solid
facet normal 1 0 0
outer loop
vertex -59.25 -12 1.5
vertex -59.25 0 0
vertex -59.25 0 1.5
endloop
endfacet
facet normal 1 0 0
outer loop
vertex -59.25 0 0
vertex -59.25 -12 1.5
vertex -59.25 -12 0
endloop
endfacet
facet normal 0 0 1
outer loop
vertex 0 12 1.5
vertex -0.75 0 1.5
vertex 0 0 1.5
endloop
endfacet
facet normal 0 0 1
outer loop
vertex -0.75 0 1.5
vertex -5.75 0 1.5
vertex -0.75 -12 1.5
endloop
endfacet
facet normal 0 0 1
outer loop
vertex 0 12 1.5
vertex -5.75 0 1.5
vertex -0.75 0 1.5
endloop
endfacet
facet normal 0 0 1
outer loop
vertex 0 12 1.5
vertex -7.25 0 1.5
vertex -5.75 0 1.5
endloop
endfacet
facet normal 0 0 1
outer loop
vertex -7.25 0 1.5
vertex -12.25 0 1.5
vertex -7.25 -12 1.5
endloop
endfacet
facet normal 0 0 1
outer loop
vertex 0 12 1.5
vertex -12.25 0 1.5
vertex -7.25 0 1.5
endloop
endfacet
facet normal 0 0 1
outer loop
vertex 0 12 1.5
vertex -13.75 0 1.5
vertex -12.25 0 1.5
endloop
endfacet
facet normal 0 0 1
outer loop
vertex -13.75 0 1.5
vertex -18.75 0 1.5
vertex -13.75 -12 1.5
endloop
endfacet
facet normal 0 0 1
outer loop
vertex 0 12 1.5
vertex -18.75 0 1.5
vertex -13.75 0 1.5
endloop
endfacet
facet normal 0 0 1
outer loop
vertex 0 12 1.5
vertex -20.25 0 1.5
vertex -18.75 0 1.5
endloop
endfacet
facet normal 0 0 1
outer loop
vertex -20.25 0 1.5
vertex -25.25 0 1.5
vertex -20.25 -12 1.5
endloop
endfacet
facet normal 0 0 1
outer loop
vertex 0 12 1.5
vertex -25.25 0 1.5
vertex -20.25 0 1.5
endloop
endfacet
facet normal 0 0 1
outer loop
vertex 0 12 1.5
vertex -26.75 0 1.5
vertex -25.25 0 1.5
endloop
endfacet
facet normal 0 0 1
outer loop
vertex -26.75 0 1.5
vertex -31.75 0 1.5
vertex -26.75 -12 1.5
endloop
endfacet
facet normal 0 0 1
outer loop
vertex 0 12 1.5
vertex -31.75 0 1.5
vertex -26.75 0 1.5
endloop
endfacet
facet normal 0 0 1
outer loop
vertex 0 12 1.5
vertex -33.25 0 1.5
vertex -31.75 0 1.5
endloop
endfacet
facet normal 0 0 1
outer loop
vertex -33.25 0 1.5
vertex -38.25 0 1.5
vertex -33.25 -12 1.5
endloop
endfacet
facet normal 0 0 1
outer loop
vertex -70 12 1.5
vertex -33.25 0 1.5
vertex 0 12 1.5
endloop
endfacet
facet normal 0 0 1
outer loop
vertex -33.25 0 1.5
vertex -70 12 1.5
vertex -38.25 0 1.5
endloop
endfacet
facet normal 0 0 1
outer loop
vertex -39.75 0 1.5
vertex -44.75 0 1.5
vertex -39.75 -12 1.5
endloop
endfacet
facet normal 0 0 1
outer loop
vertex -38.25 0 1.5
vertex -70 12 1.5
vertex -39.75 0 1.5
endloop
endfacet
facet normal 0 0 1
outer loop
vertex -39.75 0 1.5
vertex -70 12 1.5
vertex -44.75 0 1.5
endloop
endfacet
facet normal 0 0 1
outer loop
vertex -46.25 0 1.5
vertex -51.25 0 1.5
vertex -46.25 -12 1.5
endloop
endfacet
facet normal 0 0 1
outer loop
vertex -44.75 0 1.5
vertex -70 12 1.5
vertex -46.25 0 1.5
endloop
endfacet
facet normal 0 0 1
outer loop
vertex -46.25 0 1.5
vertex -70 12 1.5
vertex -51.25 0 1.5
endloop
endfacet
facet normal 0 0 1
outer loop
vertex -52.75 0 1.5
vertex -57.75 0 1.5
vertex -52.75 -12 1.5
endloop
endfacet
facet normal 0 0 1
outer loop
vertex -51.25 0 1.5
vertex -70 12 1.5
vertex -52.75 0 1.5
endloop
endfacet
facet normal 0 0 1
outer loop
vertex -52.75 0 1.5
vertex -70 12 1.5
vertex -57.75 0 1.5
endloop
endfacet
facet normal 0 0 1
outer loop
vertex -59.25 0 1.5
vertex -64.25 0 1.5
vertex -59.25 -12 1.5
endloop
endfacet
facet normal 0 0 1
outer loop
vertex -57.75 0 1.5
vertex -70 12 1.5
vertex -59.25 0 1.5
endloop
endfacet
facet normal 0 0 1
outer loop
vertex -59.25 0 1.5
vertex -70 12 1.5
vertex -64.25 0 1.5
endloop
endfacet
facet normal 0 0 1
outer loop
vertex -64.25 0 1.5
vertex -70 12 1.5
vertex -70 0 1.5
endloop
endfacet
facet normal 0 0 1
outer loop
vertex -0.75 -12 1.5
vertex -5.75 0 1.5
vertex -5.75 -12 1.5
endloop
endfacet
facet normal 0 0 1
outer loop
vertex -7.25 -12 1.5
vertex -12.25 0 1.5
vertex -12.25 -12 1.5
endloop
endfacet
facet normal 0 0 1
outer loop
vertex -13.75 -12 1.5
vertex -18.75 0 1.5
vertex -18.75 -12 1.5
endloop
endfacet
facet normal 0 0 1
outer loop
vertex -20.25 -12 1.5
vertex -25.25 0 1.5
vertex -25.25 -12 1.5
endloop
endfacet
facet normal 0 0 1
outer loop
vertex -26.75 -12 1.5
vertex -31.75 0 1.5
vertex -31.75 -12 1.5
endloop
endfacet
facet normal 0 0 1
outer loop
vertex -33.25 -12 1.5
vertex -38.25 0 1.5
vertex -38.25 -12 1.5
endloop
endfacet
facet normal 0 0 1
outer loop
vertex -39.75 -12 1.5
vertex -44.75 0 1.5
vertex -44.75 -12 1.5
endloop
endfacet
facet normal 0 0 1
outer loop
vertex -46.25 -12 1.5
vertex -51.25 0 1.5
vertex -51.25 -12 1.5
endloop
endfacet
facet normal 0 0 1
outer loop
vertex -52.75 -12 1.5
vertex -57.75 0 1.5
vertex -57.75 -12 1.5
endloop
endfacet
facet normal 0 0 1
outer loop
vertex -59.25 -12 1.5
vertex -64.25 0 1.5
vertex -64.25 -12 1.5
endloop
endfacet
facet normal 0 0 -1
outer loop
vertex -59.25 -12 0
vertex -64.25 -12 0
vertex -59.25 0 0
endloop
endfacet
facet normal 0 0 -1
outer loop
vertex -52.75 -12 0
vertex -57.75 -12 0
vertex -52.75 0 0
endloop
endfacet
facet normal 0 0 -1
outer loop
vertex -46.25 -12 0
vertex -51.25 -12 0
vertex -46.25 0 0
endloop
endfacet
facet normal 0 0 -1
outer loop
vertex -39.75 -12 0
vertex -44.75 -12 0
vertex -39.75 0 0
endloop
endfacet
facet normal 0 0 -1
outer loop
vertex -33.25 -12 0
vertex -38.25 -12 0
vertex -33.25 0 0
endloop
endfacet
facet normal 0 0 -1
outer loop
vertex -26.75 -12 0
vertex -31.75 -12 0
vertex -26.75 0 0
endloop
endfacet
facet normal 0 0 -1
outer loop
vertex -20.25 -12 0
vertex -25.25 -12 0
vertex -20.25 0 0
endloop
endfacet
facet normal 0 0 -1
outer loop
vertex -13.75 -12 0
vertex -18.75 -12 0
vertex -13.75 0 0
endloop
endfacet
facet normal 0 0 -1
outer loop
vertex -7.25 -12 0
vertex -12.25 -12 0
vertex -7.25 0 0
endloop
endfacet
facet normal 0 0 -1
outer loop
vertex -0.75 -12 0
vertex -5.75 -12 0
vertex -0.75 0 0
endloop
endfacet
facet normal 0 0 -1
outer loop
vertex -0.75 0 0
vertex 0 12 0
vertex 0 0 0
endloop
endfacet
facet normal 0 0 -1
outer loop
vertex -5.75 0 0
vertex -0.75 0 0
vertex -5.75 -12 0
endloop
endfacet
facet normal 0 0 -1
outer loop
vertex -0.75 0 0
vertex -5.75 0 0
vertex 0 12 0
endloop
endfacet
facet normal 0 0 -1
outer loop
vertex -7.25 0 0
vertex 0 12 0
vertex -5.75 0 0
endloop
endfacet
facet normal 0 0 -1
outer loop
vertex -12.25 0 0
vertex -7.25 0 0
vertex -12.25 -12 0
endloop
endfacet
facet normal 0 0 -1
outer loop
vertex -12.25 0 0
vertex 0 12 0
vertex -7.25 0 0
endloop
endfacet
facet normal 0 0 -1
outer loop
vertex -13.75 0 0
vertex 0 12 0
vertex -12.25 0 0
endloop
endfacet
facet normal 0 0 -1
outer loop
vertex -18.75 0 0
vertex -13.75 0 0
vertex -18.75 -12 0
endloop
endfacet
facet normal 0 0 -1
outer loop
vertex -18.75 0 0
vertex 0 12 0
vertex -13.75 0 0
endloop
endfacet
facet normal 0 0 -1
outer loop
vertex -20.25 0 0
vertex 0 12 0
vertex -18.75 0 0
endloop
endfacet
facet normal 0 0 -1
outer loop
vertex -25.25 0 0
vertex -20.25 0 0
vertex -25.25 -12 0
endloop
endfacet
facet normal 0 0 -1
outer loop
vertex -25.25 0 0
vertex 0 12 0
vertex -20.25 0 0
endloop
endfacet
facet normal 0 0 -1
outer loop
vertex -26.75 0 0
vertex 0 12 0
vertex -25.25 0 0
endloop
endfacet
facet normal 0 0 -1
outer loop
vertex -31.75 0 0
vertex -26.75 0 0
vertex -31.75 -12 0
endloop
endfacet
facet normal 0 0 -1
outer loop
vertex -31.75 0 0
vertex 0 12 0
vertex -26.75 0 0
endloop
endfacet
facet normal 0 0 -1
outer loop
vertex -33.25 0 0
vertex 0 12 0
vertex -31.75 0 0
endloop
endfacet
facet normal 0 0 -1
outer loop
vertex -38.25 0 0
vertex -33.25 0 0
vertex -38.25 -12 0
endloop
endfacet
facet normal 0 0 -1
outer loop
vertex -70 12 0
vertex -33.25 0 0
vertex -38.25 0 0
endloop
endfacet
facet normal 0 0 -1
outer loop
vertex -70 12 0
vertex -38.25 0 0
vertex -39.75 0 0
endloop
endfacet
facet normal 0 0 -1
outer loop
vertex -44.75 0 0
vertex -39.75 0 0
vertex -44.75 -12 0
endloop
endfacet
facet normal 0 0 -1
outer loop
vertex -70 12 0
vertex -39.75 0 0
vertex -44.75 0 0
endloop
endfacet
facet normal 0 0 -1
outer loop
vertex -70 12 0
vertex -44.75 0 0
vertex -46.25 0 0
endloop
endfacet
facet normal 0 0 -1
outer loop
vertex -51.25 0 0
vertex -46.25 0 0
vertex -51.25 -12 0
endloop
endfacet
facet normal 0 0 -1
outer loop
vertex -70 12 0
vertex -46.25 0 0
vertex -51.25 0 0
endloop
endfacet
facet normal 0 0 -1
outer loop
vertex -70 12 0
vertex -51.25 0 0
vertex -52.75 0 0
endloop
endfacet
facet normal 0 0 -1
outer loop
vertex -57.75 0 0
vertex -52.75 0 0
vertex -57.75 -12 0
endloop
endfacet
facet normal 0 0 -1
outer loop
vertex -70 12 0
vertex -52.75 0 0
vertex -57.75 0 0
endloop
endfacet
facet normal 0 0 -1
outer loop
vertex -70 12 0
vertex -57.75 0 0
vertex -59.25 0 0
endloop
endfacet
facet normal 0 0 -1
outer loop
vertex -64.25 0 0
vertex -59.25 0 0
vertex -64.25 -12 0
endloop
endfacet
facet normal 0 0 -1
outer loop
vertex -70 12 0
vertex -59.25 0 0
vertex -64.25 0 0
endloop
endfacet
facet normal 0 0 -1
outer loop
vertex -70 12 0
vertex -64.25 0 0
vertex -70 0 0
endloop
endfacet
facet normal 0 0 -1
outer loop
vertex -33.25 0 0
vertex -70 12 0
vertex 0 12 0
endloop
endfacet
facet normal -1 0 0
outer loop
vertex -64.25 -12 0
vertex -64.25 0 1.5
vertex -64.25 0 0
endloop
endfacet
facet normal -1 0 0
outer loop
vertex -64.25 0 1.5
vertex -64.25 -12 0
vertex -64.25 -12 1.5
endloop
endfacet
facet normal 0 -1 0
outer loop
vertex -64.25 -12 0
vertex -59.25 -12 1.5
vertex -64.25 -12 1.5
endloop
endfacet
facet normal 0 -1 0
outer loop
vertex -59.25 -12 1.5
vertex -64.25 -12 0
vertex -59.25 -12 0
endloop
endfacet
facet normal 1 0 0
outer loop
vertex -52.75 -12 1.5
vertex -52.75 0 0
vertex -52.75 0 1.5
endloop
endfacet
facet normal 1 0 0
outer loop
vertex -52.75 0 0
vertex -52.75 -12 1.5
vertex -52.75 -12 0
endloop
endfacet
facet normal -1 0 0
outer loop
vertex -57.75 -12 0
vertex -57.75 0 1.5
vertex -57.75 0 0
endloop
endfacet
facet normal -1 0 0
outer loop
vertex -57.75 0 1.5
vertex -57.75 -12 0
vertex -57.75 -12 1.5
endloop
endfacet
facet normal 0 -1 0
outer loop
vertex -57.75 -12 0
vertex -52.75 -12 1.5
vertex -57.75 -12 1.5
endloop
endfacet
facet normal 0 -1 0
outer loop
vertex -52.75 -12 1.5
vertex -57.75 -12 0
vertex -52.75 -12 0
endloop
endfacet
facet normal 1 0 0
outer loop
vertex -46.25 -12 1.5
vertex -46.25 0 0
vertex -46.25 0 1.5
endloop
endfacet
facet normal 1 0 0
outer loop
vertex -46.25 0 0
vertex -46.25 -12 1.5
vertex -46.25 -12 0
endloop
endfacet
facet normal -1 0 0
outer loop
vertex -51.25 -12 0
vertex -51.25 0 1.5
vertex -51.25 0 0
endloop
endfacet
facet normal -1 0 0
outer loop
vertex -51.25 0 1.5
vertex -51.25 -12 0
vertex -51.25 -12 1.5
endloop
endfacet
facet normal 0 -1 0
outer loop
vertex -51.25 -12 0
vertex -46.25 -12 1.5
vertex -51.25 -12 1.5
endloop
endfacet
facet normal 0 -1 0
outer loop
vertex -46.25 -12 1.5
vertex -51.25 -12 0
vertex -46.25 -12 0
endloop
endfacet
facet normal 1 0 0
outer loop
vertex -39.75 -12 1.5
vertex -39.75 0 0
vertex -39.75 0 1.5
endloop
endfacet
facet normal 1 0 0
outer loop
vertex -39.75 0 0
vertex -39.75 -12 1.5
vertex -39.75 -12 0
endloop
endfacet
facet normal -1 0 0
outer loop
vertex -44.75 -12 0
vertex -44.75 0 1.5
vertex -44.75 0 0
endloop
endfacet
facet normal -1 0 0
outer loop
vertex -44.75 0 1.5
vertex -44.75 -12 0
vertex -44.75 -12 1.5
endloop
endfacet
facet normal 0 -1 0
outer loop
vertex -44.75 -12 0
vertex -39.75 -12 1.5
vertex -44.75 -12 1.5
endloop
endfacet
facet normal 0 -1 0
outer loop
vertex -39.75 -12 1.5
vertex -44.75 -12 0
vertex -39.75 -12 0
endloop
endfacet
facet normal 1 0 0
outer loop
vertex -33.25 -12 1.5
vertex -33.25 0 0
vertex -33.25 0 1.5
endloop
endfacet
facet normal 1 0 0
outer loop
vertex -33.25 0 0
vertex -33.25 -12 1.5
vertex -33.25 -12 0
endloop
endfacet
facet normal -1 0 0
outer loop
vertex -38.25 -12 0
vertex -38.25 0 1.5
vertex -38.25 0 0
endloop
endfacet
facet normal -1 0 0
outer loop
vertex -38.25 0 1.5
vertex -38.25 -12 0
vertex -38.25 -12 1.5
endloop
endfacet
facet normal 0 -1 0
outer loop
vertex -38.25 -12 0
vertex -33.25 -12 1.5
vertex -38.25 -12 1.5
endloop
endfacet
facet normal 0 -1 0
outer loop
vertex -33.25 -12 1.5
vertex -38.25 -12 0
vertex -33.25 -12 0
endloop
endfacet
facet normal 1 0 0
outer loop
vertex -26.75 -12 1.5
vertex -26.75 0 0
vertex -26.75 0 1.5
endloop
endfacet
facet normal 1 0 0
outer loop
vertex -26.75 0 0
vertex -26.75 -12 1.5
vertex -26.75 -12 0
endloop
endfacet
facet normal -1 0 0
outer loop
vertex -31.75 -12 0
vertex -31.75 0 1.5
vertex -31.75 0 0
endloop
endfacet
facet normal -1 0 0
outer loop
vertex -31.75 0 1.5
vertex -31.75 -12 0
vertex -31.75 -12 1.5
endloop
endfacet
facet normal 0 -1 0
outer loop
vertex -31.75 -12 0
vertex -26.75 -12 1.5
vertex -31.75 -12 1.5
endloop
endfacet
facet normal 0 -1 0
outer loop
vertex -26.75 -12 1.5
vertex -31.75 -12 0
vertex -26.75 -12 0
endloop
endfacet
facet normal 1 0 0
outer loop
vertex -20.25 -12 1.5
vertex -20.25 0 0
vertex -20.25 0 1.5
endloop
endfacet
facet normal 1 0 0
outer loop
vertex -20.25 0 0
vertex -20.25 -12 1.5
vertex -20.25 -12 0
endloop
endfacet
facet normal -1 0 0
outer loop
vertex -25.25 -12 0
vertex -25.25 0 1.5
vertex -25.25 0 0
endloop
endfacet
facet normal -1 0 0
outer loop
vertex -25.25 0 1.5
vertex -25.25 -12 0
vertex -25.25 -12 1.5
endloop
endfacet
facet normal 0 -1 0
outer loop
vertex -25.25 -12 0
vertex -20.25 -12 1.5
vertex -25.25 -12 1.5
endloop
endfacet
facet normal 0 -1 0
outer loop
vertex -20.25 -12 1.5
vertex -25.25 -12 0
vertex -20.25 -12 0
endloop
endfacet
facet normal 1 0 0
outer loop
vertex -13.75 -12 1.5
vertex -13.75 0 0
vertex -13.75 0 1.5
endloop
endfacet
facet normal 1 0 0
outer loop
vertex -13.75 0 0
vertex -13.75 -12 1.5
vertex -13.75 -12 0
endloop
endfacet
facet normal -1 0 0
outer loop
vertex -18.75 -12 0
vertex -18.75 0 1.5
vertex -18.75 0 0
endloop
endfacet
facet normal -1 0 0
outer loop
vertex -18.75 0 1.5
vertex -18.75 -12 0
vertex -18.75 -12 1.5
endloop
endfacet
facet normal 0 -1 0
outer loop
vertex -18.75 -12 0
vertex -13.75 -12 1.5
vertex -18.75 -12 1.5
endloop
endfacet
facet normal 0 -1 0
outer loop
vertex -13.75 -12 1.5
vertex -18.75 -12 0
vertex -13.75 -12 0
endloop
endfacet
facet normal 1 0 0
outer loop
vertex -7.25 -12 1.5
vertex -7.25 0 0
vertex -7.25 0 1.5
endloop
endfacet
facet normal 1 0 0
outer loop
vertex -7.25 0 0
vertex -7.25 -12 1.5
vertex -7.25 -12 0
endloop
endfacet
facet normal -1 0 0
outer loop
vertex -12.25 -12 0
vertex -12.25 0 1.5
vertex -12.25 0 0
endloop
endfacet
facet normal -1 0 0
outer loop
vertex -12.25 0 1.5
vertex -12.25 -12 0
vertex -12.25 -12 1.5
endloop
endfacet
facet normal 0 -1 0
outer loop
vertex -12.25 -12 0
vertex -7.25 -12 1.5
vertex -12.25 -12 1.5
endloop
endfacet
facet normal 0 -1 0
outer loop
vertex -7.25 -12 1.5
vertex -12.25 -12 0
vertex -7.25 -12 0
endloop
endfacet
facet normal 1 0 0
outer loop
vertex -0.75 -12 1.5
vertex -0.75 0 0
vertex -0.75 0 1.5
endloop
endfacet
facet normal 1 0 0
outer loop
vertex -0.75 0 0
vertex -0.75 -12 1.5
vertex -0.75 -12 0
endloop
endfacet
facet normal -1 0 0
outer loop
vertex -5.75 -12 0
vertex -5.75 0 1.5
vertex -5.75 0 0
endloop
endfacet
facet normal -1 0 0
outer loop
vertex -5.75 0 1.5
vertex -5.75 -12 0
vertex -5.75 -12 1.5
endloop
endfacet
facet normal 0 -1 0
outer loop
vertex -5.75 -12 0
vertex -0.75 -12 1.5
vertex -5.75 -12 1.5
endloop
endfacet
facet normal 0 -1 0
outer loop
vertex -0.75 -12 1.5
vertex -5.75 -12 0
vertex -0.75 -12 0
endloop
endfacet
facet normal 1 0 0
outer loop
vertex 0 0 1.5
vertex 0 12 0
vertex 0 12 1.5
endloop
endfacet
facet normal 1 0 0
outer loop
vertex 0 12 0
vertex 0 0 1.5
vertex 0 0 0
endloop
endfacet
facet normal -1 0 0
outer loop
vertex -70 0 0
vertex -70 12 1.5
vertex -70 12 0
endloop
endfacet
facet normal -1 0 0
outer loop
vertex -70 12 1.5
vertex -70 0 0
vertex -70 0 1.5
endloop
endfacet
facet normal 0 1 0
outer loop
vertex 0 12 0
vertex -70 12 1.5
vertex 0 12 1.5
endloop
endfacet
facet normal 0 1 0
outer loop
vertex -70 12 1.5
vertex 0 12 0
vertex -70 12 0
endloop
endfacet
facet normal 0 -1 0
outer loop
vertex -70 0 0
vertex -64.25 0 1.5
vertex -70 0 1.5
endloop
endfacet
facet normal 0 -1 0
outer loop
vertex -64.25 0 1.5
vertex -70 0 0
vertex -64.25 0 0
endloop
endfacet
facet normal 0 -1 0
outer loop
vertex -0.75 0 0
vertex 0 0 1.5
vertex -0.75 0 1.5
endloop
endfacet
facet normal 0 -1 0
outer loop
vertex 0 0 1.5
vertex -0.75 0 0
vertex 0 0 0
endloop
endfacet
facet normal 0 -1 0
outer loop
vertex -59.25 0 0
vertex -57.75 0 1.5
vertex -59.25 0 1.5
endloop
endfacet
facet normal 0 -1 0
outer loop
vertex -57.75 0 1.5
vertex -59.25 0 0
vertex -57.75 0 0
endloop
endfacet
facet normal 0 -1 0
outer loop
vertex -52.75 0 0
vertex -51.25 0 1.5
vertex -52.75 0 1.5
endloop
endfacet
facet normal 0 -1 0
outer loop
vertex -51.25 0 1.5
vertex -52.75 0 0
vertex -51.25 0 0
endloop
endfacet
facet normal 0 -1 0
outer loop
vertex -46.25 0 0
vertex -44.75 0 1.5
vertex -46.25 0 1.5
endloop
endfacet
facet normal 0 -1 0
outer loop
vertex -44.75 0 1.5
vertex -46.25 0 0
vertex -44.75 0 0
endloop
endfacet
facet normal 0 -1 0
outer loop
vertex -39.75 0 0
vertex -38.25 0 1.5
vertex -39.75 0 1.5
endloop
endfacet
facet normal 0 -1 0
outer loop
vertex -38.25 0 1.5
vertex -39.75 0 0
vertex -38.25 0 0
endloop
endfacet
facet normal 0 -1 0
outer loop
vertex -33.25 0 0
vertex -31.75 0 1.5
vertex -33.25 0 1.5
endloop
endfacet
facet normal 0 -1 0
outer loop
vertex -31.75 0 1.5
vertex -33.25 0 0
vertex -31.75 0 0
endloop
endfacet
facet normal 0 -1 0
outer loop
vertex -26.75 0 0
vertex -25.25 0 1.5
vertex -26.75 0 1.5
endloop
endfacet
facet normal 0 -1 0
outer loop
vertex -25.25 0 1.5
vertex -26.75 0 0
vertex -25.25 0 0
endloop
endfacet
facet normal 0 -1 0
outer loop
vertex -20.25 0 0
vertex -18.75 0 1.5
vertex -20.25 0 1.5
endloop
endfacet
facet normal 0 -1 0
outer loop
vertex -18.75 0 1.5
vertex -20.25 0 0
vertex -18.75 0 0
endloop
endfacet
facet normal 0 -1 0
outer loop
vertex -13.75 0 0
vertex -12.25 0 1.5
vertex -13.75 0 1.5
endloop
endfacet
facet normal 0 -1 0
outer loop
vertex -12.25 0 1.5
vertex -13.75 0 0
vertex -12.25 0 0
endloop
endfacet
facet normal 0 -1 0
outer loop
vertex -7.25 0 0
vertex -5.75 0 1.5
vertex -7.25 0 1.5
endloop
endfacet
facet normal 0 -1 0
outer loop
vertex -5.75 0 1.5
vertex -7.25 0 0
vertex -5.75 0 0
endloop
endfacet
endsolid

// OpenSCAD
// 10-well agarose gel comb - printed lying flat
// Units: mm

// ---- Spine (back bar) ----
spine_len   = 70;    // X length of spine
spine_wid   = 12;    // Y width of spine

// ---- Teeth ----
tooth_count = 10;    // number of wells
tooth_wid   = 5.0;   // tooth width along X
tooth_len   = 12;    // tooth length along Y
gap         = 1.5;   // gap between neighbouring teeth (X)

// ---- Plate ----
plate_t     = 1.5;   // plate thickness (Z)

// ---- Misc ----
eps         = 0.5;   // cutter overshoot past faces
$fn         = 64;

// Tooth pitch (tooth + gap) and row offset so the row is centred on the spine
pitch       = tooth_wid + gap;
row_start_x = -(tooth_count - 1) * pitch / 2;

// Teeth hang in -Y from the spine's long edge (at x = 0 in this local frame)
// The file is centred on the origin in X and Y, resting on z = 0.
translate([-spine_len / 2, 0, 0])
    union() {
        // Spine
        translate([-spine_len / 2, 0, 0])
            cube([spine_len, spine_wid, plate_t]);

        // Teeth
        for (i = [0 : tooth_count - 1])
            translate([row_start_x + i * pitch, -tooth_len, 0])
                cube([tooth_wid, tooth_len + eps, plate_t]);
    }
